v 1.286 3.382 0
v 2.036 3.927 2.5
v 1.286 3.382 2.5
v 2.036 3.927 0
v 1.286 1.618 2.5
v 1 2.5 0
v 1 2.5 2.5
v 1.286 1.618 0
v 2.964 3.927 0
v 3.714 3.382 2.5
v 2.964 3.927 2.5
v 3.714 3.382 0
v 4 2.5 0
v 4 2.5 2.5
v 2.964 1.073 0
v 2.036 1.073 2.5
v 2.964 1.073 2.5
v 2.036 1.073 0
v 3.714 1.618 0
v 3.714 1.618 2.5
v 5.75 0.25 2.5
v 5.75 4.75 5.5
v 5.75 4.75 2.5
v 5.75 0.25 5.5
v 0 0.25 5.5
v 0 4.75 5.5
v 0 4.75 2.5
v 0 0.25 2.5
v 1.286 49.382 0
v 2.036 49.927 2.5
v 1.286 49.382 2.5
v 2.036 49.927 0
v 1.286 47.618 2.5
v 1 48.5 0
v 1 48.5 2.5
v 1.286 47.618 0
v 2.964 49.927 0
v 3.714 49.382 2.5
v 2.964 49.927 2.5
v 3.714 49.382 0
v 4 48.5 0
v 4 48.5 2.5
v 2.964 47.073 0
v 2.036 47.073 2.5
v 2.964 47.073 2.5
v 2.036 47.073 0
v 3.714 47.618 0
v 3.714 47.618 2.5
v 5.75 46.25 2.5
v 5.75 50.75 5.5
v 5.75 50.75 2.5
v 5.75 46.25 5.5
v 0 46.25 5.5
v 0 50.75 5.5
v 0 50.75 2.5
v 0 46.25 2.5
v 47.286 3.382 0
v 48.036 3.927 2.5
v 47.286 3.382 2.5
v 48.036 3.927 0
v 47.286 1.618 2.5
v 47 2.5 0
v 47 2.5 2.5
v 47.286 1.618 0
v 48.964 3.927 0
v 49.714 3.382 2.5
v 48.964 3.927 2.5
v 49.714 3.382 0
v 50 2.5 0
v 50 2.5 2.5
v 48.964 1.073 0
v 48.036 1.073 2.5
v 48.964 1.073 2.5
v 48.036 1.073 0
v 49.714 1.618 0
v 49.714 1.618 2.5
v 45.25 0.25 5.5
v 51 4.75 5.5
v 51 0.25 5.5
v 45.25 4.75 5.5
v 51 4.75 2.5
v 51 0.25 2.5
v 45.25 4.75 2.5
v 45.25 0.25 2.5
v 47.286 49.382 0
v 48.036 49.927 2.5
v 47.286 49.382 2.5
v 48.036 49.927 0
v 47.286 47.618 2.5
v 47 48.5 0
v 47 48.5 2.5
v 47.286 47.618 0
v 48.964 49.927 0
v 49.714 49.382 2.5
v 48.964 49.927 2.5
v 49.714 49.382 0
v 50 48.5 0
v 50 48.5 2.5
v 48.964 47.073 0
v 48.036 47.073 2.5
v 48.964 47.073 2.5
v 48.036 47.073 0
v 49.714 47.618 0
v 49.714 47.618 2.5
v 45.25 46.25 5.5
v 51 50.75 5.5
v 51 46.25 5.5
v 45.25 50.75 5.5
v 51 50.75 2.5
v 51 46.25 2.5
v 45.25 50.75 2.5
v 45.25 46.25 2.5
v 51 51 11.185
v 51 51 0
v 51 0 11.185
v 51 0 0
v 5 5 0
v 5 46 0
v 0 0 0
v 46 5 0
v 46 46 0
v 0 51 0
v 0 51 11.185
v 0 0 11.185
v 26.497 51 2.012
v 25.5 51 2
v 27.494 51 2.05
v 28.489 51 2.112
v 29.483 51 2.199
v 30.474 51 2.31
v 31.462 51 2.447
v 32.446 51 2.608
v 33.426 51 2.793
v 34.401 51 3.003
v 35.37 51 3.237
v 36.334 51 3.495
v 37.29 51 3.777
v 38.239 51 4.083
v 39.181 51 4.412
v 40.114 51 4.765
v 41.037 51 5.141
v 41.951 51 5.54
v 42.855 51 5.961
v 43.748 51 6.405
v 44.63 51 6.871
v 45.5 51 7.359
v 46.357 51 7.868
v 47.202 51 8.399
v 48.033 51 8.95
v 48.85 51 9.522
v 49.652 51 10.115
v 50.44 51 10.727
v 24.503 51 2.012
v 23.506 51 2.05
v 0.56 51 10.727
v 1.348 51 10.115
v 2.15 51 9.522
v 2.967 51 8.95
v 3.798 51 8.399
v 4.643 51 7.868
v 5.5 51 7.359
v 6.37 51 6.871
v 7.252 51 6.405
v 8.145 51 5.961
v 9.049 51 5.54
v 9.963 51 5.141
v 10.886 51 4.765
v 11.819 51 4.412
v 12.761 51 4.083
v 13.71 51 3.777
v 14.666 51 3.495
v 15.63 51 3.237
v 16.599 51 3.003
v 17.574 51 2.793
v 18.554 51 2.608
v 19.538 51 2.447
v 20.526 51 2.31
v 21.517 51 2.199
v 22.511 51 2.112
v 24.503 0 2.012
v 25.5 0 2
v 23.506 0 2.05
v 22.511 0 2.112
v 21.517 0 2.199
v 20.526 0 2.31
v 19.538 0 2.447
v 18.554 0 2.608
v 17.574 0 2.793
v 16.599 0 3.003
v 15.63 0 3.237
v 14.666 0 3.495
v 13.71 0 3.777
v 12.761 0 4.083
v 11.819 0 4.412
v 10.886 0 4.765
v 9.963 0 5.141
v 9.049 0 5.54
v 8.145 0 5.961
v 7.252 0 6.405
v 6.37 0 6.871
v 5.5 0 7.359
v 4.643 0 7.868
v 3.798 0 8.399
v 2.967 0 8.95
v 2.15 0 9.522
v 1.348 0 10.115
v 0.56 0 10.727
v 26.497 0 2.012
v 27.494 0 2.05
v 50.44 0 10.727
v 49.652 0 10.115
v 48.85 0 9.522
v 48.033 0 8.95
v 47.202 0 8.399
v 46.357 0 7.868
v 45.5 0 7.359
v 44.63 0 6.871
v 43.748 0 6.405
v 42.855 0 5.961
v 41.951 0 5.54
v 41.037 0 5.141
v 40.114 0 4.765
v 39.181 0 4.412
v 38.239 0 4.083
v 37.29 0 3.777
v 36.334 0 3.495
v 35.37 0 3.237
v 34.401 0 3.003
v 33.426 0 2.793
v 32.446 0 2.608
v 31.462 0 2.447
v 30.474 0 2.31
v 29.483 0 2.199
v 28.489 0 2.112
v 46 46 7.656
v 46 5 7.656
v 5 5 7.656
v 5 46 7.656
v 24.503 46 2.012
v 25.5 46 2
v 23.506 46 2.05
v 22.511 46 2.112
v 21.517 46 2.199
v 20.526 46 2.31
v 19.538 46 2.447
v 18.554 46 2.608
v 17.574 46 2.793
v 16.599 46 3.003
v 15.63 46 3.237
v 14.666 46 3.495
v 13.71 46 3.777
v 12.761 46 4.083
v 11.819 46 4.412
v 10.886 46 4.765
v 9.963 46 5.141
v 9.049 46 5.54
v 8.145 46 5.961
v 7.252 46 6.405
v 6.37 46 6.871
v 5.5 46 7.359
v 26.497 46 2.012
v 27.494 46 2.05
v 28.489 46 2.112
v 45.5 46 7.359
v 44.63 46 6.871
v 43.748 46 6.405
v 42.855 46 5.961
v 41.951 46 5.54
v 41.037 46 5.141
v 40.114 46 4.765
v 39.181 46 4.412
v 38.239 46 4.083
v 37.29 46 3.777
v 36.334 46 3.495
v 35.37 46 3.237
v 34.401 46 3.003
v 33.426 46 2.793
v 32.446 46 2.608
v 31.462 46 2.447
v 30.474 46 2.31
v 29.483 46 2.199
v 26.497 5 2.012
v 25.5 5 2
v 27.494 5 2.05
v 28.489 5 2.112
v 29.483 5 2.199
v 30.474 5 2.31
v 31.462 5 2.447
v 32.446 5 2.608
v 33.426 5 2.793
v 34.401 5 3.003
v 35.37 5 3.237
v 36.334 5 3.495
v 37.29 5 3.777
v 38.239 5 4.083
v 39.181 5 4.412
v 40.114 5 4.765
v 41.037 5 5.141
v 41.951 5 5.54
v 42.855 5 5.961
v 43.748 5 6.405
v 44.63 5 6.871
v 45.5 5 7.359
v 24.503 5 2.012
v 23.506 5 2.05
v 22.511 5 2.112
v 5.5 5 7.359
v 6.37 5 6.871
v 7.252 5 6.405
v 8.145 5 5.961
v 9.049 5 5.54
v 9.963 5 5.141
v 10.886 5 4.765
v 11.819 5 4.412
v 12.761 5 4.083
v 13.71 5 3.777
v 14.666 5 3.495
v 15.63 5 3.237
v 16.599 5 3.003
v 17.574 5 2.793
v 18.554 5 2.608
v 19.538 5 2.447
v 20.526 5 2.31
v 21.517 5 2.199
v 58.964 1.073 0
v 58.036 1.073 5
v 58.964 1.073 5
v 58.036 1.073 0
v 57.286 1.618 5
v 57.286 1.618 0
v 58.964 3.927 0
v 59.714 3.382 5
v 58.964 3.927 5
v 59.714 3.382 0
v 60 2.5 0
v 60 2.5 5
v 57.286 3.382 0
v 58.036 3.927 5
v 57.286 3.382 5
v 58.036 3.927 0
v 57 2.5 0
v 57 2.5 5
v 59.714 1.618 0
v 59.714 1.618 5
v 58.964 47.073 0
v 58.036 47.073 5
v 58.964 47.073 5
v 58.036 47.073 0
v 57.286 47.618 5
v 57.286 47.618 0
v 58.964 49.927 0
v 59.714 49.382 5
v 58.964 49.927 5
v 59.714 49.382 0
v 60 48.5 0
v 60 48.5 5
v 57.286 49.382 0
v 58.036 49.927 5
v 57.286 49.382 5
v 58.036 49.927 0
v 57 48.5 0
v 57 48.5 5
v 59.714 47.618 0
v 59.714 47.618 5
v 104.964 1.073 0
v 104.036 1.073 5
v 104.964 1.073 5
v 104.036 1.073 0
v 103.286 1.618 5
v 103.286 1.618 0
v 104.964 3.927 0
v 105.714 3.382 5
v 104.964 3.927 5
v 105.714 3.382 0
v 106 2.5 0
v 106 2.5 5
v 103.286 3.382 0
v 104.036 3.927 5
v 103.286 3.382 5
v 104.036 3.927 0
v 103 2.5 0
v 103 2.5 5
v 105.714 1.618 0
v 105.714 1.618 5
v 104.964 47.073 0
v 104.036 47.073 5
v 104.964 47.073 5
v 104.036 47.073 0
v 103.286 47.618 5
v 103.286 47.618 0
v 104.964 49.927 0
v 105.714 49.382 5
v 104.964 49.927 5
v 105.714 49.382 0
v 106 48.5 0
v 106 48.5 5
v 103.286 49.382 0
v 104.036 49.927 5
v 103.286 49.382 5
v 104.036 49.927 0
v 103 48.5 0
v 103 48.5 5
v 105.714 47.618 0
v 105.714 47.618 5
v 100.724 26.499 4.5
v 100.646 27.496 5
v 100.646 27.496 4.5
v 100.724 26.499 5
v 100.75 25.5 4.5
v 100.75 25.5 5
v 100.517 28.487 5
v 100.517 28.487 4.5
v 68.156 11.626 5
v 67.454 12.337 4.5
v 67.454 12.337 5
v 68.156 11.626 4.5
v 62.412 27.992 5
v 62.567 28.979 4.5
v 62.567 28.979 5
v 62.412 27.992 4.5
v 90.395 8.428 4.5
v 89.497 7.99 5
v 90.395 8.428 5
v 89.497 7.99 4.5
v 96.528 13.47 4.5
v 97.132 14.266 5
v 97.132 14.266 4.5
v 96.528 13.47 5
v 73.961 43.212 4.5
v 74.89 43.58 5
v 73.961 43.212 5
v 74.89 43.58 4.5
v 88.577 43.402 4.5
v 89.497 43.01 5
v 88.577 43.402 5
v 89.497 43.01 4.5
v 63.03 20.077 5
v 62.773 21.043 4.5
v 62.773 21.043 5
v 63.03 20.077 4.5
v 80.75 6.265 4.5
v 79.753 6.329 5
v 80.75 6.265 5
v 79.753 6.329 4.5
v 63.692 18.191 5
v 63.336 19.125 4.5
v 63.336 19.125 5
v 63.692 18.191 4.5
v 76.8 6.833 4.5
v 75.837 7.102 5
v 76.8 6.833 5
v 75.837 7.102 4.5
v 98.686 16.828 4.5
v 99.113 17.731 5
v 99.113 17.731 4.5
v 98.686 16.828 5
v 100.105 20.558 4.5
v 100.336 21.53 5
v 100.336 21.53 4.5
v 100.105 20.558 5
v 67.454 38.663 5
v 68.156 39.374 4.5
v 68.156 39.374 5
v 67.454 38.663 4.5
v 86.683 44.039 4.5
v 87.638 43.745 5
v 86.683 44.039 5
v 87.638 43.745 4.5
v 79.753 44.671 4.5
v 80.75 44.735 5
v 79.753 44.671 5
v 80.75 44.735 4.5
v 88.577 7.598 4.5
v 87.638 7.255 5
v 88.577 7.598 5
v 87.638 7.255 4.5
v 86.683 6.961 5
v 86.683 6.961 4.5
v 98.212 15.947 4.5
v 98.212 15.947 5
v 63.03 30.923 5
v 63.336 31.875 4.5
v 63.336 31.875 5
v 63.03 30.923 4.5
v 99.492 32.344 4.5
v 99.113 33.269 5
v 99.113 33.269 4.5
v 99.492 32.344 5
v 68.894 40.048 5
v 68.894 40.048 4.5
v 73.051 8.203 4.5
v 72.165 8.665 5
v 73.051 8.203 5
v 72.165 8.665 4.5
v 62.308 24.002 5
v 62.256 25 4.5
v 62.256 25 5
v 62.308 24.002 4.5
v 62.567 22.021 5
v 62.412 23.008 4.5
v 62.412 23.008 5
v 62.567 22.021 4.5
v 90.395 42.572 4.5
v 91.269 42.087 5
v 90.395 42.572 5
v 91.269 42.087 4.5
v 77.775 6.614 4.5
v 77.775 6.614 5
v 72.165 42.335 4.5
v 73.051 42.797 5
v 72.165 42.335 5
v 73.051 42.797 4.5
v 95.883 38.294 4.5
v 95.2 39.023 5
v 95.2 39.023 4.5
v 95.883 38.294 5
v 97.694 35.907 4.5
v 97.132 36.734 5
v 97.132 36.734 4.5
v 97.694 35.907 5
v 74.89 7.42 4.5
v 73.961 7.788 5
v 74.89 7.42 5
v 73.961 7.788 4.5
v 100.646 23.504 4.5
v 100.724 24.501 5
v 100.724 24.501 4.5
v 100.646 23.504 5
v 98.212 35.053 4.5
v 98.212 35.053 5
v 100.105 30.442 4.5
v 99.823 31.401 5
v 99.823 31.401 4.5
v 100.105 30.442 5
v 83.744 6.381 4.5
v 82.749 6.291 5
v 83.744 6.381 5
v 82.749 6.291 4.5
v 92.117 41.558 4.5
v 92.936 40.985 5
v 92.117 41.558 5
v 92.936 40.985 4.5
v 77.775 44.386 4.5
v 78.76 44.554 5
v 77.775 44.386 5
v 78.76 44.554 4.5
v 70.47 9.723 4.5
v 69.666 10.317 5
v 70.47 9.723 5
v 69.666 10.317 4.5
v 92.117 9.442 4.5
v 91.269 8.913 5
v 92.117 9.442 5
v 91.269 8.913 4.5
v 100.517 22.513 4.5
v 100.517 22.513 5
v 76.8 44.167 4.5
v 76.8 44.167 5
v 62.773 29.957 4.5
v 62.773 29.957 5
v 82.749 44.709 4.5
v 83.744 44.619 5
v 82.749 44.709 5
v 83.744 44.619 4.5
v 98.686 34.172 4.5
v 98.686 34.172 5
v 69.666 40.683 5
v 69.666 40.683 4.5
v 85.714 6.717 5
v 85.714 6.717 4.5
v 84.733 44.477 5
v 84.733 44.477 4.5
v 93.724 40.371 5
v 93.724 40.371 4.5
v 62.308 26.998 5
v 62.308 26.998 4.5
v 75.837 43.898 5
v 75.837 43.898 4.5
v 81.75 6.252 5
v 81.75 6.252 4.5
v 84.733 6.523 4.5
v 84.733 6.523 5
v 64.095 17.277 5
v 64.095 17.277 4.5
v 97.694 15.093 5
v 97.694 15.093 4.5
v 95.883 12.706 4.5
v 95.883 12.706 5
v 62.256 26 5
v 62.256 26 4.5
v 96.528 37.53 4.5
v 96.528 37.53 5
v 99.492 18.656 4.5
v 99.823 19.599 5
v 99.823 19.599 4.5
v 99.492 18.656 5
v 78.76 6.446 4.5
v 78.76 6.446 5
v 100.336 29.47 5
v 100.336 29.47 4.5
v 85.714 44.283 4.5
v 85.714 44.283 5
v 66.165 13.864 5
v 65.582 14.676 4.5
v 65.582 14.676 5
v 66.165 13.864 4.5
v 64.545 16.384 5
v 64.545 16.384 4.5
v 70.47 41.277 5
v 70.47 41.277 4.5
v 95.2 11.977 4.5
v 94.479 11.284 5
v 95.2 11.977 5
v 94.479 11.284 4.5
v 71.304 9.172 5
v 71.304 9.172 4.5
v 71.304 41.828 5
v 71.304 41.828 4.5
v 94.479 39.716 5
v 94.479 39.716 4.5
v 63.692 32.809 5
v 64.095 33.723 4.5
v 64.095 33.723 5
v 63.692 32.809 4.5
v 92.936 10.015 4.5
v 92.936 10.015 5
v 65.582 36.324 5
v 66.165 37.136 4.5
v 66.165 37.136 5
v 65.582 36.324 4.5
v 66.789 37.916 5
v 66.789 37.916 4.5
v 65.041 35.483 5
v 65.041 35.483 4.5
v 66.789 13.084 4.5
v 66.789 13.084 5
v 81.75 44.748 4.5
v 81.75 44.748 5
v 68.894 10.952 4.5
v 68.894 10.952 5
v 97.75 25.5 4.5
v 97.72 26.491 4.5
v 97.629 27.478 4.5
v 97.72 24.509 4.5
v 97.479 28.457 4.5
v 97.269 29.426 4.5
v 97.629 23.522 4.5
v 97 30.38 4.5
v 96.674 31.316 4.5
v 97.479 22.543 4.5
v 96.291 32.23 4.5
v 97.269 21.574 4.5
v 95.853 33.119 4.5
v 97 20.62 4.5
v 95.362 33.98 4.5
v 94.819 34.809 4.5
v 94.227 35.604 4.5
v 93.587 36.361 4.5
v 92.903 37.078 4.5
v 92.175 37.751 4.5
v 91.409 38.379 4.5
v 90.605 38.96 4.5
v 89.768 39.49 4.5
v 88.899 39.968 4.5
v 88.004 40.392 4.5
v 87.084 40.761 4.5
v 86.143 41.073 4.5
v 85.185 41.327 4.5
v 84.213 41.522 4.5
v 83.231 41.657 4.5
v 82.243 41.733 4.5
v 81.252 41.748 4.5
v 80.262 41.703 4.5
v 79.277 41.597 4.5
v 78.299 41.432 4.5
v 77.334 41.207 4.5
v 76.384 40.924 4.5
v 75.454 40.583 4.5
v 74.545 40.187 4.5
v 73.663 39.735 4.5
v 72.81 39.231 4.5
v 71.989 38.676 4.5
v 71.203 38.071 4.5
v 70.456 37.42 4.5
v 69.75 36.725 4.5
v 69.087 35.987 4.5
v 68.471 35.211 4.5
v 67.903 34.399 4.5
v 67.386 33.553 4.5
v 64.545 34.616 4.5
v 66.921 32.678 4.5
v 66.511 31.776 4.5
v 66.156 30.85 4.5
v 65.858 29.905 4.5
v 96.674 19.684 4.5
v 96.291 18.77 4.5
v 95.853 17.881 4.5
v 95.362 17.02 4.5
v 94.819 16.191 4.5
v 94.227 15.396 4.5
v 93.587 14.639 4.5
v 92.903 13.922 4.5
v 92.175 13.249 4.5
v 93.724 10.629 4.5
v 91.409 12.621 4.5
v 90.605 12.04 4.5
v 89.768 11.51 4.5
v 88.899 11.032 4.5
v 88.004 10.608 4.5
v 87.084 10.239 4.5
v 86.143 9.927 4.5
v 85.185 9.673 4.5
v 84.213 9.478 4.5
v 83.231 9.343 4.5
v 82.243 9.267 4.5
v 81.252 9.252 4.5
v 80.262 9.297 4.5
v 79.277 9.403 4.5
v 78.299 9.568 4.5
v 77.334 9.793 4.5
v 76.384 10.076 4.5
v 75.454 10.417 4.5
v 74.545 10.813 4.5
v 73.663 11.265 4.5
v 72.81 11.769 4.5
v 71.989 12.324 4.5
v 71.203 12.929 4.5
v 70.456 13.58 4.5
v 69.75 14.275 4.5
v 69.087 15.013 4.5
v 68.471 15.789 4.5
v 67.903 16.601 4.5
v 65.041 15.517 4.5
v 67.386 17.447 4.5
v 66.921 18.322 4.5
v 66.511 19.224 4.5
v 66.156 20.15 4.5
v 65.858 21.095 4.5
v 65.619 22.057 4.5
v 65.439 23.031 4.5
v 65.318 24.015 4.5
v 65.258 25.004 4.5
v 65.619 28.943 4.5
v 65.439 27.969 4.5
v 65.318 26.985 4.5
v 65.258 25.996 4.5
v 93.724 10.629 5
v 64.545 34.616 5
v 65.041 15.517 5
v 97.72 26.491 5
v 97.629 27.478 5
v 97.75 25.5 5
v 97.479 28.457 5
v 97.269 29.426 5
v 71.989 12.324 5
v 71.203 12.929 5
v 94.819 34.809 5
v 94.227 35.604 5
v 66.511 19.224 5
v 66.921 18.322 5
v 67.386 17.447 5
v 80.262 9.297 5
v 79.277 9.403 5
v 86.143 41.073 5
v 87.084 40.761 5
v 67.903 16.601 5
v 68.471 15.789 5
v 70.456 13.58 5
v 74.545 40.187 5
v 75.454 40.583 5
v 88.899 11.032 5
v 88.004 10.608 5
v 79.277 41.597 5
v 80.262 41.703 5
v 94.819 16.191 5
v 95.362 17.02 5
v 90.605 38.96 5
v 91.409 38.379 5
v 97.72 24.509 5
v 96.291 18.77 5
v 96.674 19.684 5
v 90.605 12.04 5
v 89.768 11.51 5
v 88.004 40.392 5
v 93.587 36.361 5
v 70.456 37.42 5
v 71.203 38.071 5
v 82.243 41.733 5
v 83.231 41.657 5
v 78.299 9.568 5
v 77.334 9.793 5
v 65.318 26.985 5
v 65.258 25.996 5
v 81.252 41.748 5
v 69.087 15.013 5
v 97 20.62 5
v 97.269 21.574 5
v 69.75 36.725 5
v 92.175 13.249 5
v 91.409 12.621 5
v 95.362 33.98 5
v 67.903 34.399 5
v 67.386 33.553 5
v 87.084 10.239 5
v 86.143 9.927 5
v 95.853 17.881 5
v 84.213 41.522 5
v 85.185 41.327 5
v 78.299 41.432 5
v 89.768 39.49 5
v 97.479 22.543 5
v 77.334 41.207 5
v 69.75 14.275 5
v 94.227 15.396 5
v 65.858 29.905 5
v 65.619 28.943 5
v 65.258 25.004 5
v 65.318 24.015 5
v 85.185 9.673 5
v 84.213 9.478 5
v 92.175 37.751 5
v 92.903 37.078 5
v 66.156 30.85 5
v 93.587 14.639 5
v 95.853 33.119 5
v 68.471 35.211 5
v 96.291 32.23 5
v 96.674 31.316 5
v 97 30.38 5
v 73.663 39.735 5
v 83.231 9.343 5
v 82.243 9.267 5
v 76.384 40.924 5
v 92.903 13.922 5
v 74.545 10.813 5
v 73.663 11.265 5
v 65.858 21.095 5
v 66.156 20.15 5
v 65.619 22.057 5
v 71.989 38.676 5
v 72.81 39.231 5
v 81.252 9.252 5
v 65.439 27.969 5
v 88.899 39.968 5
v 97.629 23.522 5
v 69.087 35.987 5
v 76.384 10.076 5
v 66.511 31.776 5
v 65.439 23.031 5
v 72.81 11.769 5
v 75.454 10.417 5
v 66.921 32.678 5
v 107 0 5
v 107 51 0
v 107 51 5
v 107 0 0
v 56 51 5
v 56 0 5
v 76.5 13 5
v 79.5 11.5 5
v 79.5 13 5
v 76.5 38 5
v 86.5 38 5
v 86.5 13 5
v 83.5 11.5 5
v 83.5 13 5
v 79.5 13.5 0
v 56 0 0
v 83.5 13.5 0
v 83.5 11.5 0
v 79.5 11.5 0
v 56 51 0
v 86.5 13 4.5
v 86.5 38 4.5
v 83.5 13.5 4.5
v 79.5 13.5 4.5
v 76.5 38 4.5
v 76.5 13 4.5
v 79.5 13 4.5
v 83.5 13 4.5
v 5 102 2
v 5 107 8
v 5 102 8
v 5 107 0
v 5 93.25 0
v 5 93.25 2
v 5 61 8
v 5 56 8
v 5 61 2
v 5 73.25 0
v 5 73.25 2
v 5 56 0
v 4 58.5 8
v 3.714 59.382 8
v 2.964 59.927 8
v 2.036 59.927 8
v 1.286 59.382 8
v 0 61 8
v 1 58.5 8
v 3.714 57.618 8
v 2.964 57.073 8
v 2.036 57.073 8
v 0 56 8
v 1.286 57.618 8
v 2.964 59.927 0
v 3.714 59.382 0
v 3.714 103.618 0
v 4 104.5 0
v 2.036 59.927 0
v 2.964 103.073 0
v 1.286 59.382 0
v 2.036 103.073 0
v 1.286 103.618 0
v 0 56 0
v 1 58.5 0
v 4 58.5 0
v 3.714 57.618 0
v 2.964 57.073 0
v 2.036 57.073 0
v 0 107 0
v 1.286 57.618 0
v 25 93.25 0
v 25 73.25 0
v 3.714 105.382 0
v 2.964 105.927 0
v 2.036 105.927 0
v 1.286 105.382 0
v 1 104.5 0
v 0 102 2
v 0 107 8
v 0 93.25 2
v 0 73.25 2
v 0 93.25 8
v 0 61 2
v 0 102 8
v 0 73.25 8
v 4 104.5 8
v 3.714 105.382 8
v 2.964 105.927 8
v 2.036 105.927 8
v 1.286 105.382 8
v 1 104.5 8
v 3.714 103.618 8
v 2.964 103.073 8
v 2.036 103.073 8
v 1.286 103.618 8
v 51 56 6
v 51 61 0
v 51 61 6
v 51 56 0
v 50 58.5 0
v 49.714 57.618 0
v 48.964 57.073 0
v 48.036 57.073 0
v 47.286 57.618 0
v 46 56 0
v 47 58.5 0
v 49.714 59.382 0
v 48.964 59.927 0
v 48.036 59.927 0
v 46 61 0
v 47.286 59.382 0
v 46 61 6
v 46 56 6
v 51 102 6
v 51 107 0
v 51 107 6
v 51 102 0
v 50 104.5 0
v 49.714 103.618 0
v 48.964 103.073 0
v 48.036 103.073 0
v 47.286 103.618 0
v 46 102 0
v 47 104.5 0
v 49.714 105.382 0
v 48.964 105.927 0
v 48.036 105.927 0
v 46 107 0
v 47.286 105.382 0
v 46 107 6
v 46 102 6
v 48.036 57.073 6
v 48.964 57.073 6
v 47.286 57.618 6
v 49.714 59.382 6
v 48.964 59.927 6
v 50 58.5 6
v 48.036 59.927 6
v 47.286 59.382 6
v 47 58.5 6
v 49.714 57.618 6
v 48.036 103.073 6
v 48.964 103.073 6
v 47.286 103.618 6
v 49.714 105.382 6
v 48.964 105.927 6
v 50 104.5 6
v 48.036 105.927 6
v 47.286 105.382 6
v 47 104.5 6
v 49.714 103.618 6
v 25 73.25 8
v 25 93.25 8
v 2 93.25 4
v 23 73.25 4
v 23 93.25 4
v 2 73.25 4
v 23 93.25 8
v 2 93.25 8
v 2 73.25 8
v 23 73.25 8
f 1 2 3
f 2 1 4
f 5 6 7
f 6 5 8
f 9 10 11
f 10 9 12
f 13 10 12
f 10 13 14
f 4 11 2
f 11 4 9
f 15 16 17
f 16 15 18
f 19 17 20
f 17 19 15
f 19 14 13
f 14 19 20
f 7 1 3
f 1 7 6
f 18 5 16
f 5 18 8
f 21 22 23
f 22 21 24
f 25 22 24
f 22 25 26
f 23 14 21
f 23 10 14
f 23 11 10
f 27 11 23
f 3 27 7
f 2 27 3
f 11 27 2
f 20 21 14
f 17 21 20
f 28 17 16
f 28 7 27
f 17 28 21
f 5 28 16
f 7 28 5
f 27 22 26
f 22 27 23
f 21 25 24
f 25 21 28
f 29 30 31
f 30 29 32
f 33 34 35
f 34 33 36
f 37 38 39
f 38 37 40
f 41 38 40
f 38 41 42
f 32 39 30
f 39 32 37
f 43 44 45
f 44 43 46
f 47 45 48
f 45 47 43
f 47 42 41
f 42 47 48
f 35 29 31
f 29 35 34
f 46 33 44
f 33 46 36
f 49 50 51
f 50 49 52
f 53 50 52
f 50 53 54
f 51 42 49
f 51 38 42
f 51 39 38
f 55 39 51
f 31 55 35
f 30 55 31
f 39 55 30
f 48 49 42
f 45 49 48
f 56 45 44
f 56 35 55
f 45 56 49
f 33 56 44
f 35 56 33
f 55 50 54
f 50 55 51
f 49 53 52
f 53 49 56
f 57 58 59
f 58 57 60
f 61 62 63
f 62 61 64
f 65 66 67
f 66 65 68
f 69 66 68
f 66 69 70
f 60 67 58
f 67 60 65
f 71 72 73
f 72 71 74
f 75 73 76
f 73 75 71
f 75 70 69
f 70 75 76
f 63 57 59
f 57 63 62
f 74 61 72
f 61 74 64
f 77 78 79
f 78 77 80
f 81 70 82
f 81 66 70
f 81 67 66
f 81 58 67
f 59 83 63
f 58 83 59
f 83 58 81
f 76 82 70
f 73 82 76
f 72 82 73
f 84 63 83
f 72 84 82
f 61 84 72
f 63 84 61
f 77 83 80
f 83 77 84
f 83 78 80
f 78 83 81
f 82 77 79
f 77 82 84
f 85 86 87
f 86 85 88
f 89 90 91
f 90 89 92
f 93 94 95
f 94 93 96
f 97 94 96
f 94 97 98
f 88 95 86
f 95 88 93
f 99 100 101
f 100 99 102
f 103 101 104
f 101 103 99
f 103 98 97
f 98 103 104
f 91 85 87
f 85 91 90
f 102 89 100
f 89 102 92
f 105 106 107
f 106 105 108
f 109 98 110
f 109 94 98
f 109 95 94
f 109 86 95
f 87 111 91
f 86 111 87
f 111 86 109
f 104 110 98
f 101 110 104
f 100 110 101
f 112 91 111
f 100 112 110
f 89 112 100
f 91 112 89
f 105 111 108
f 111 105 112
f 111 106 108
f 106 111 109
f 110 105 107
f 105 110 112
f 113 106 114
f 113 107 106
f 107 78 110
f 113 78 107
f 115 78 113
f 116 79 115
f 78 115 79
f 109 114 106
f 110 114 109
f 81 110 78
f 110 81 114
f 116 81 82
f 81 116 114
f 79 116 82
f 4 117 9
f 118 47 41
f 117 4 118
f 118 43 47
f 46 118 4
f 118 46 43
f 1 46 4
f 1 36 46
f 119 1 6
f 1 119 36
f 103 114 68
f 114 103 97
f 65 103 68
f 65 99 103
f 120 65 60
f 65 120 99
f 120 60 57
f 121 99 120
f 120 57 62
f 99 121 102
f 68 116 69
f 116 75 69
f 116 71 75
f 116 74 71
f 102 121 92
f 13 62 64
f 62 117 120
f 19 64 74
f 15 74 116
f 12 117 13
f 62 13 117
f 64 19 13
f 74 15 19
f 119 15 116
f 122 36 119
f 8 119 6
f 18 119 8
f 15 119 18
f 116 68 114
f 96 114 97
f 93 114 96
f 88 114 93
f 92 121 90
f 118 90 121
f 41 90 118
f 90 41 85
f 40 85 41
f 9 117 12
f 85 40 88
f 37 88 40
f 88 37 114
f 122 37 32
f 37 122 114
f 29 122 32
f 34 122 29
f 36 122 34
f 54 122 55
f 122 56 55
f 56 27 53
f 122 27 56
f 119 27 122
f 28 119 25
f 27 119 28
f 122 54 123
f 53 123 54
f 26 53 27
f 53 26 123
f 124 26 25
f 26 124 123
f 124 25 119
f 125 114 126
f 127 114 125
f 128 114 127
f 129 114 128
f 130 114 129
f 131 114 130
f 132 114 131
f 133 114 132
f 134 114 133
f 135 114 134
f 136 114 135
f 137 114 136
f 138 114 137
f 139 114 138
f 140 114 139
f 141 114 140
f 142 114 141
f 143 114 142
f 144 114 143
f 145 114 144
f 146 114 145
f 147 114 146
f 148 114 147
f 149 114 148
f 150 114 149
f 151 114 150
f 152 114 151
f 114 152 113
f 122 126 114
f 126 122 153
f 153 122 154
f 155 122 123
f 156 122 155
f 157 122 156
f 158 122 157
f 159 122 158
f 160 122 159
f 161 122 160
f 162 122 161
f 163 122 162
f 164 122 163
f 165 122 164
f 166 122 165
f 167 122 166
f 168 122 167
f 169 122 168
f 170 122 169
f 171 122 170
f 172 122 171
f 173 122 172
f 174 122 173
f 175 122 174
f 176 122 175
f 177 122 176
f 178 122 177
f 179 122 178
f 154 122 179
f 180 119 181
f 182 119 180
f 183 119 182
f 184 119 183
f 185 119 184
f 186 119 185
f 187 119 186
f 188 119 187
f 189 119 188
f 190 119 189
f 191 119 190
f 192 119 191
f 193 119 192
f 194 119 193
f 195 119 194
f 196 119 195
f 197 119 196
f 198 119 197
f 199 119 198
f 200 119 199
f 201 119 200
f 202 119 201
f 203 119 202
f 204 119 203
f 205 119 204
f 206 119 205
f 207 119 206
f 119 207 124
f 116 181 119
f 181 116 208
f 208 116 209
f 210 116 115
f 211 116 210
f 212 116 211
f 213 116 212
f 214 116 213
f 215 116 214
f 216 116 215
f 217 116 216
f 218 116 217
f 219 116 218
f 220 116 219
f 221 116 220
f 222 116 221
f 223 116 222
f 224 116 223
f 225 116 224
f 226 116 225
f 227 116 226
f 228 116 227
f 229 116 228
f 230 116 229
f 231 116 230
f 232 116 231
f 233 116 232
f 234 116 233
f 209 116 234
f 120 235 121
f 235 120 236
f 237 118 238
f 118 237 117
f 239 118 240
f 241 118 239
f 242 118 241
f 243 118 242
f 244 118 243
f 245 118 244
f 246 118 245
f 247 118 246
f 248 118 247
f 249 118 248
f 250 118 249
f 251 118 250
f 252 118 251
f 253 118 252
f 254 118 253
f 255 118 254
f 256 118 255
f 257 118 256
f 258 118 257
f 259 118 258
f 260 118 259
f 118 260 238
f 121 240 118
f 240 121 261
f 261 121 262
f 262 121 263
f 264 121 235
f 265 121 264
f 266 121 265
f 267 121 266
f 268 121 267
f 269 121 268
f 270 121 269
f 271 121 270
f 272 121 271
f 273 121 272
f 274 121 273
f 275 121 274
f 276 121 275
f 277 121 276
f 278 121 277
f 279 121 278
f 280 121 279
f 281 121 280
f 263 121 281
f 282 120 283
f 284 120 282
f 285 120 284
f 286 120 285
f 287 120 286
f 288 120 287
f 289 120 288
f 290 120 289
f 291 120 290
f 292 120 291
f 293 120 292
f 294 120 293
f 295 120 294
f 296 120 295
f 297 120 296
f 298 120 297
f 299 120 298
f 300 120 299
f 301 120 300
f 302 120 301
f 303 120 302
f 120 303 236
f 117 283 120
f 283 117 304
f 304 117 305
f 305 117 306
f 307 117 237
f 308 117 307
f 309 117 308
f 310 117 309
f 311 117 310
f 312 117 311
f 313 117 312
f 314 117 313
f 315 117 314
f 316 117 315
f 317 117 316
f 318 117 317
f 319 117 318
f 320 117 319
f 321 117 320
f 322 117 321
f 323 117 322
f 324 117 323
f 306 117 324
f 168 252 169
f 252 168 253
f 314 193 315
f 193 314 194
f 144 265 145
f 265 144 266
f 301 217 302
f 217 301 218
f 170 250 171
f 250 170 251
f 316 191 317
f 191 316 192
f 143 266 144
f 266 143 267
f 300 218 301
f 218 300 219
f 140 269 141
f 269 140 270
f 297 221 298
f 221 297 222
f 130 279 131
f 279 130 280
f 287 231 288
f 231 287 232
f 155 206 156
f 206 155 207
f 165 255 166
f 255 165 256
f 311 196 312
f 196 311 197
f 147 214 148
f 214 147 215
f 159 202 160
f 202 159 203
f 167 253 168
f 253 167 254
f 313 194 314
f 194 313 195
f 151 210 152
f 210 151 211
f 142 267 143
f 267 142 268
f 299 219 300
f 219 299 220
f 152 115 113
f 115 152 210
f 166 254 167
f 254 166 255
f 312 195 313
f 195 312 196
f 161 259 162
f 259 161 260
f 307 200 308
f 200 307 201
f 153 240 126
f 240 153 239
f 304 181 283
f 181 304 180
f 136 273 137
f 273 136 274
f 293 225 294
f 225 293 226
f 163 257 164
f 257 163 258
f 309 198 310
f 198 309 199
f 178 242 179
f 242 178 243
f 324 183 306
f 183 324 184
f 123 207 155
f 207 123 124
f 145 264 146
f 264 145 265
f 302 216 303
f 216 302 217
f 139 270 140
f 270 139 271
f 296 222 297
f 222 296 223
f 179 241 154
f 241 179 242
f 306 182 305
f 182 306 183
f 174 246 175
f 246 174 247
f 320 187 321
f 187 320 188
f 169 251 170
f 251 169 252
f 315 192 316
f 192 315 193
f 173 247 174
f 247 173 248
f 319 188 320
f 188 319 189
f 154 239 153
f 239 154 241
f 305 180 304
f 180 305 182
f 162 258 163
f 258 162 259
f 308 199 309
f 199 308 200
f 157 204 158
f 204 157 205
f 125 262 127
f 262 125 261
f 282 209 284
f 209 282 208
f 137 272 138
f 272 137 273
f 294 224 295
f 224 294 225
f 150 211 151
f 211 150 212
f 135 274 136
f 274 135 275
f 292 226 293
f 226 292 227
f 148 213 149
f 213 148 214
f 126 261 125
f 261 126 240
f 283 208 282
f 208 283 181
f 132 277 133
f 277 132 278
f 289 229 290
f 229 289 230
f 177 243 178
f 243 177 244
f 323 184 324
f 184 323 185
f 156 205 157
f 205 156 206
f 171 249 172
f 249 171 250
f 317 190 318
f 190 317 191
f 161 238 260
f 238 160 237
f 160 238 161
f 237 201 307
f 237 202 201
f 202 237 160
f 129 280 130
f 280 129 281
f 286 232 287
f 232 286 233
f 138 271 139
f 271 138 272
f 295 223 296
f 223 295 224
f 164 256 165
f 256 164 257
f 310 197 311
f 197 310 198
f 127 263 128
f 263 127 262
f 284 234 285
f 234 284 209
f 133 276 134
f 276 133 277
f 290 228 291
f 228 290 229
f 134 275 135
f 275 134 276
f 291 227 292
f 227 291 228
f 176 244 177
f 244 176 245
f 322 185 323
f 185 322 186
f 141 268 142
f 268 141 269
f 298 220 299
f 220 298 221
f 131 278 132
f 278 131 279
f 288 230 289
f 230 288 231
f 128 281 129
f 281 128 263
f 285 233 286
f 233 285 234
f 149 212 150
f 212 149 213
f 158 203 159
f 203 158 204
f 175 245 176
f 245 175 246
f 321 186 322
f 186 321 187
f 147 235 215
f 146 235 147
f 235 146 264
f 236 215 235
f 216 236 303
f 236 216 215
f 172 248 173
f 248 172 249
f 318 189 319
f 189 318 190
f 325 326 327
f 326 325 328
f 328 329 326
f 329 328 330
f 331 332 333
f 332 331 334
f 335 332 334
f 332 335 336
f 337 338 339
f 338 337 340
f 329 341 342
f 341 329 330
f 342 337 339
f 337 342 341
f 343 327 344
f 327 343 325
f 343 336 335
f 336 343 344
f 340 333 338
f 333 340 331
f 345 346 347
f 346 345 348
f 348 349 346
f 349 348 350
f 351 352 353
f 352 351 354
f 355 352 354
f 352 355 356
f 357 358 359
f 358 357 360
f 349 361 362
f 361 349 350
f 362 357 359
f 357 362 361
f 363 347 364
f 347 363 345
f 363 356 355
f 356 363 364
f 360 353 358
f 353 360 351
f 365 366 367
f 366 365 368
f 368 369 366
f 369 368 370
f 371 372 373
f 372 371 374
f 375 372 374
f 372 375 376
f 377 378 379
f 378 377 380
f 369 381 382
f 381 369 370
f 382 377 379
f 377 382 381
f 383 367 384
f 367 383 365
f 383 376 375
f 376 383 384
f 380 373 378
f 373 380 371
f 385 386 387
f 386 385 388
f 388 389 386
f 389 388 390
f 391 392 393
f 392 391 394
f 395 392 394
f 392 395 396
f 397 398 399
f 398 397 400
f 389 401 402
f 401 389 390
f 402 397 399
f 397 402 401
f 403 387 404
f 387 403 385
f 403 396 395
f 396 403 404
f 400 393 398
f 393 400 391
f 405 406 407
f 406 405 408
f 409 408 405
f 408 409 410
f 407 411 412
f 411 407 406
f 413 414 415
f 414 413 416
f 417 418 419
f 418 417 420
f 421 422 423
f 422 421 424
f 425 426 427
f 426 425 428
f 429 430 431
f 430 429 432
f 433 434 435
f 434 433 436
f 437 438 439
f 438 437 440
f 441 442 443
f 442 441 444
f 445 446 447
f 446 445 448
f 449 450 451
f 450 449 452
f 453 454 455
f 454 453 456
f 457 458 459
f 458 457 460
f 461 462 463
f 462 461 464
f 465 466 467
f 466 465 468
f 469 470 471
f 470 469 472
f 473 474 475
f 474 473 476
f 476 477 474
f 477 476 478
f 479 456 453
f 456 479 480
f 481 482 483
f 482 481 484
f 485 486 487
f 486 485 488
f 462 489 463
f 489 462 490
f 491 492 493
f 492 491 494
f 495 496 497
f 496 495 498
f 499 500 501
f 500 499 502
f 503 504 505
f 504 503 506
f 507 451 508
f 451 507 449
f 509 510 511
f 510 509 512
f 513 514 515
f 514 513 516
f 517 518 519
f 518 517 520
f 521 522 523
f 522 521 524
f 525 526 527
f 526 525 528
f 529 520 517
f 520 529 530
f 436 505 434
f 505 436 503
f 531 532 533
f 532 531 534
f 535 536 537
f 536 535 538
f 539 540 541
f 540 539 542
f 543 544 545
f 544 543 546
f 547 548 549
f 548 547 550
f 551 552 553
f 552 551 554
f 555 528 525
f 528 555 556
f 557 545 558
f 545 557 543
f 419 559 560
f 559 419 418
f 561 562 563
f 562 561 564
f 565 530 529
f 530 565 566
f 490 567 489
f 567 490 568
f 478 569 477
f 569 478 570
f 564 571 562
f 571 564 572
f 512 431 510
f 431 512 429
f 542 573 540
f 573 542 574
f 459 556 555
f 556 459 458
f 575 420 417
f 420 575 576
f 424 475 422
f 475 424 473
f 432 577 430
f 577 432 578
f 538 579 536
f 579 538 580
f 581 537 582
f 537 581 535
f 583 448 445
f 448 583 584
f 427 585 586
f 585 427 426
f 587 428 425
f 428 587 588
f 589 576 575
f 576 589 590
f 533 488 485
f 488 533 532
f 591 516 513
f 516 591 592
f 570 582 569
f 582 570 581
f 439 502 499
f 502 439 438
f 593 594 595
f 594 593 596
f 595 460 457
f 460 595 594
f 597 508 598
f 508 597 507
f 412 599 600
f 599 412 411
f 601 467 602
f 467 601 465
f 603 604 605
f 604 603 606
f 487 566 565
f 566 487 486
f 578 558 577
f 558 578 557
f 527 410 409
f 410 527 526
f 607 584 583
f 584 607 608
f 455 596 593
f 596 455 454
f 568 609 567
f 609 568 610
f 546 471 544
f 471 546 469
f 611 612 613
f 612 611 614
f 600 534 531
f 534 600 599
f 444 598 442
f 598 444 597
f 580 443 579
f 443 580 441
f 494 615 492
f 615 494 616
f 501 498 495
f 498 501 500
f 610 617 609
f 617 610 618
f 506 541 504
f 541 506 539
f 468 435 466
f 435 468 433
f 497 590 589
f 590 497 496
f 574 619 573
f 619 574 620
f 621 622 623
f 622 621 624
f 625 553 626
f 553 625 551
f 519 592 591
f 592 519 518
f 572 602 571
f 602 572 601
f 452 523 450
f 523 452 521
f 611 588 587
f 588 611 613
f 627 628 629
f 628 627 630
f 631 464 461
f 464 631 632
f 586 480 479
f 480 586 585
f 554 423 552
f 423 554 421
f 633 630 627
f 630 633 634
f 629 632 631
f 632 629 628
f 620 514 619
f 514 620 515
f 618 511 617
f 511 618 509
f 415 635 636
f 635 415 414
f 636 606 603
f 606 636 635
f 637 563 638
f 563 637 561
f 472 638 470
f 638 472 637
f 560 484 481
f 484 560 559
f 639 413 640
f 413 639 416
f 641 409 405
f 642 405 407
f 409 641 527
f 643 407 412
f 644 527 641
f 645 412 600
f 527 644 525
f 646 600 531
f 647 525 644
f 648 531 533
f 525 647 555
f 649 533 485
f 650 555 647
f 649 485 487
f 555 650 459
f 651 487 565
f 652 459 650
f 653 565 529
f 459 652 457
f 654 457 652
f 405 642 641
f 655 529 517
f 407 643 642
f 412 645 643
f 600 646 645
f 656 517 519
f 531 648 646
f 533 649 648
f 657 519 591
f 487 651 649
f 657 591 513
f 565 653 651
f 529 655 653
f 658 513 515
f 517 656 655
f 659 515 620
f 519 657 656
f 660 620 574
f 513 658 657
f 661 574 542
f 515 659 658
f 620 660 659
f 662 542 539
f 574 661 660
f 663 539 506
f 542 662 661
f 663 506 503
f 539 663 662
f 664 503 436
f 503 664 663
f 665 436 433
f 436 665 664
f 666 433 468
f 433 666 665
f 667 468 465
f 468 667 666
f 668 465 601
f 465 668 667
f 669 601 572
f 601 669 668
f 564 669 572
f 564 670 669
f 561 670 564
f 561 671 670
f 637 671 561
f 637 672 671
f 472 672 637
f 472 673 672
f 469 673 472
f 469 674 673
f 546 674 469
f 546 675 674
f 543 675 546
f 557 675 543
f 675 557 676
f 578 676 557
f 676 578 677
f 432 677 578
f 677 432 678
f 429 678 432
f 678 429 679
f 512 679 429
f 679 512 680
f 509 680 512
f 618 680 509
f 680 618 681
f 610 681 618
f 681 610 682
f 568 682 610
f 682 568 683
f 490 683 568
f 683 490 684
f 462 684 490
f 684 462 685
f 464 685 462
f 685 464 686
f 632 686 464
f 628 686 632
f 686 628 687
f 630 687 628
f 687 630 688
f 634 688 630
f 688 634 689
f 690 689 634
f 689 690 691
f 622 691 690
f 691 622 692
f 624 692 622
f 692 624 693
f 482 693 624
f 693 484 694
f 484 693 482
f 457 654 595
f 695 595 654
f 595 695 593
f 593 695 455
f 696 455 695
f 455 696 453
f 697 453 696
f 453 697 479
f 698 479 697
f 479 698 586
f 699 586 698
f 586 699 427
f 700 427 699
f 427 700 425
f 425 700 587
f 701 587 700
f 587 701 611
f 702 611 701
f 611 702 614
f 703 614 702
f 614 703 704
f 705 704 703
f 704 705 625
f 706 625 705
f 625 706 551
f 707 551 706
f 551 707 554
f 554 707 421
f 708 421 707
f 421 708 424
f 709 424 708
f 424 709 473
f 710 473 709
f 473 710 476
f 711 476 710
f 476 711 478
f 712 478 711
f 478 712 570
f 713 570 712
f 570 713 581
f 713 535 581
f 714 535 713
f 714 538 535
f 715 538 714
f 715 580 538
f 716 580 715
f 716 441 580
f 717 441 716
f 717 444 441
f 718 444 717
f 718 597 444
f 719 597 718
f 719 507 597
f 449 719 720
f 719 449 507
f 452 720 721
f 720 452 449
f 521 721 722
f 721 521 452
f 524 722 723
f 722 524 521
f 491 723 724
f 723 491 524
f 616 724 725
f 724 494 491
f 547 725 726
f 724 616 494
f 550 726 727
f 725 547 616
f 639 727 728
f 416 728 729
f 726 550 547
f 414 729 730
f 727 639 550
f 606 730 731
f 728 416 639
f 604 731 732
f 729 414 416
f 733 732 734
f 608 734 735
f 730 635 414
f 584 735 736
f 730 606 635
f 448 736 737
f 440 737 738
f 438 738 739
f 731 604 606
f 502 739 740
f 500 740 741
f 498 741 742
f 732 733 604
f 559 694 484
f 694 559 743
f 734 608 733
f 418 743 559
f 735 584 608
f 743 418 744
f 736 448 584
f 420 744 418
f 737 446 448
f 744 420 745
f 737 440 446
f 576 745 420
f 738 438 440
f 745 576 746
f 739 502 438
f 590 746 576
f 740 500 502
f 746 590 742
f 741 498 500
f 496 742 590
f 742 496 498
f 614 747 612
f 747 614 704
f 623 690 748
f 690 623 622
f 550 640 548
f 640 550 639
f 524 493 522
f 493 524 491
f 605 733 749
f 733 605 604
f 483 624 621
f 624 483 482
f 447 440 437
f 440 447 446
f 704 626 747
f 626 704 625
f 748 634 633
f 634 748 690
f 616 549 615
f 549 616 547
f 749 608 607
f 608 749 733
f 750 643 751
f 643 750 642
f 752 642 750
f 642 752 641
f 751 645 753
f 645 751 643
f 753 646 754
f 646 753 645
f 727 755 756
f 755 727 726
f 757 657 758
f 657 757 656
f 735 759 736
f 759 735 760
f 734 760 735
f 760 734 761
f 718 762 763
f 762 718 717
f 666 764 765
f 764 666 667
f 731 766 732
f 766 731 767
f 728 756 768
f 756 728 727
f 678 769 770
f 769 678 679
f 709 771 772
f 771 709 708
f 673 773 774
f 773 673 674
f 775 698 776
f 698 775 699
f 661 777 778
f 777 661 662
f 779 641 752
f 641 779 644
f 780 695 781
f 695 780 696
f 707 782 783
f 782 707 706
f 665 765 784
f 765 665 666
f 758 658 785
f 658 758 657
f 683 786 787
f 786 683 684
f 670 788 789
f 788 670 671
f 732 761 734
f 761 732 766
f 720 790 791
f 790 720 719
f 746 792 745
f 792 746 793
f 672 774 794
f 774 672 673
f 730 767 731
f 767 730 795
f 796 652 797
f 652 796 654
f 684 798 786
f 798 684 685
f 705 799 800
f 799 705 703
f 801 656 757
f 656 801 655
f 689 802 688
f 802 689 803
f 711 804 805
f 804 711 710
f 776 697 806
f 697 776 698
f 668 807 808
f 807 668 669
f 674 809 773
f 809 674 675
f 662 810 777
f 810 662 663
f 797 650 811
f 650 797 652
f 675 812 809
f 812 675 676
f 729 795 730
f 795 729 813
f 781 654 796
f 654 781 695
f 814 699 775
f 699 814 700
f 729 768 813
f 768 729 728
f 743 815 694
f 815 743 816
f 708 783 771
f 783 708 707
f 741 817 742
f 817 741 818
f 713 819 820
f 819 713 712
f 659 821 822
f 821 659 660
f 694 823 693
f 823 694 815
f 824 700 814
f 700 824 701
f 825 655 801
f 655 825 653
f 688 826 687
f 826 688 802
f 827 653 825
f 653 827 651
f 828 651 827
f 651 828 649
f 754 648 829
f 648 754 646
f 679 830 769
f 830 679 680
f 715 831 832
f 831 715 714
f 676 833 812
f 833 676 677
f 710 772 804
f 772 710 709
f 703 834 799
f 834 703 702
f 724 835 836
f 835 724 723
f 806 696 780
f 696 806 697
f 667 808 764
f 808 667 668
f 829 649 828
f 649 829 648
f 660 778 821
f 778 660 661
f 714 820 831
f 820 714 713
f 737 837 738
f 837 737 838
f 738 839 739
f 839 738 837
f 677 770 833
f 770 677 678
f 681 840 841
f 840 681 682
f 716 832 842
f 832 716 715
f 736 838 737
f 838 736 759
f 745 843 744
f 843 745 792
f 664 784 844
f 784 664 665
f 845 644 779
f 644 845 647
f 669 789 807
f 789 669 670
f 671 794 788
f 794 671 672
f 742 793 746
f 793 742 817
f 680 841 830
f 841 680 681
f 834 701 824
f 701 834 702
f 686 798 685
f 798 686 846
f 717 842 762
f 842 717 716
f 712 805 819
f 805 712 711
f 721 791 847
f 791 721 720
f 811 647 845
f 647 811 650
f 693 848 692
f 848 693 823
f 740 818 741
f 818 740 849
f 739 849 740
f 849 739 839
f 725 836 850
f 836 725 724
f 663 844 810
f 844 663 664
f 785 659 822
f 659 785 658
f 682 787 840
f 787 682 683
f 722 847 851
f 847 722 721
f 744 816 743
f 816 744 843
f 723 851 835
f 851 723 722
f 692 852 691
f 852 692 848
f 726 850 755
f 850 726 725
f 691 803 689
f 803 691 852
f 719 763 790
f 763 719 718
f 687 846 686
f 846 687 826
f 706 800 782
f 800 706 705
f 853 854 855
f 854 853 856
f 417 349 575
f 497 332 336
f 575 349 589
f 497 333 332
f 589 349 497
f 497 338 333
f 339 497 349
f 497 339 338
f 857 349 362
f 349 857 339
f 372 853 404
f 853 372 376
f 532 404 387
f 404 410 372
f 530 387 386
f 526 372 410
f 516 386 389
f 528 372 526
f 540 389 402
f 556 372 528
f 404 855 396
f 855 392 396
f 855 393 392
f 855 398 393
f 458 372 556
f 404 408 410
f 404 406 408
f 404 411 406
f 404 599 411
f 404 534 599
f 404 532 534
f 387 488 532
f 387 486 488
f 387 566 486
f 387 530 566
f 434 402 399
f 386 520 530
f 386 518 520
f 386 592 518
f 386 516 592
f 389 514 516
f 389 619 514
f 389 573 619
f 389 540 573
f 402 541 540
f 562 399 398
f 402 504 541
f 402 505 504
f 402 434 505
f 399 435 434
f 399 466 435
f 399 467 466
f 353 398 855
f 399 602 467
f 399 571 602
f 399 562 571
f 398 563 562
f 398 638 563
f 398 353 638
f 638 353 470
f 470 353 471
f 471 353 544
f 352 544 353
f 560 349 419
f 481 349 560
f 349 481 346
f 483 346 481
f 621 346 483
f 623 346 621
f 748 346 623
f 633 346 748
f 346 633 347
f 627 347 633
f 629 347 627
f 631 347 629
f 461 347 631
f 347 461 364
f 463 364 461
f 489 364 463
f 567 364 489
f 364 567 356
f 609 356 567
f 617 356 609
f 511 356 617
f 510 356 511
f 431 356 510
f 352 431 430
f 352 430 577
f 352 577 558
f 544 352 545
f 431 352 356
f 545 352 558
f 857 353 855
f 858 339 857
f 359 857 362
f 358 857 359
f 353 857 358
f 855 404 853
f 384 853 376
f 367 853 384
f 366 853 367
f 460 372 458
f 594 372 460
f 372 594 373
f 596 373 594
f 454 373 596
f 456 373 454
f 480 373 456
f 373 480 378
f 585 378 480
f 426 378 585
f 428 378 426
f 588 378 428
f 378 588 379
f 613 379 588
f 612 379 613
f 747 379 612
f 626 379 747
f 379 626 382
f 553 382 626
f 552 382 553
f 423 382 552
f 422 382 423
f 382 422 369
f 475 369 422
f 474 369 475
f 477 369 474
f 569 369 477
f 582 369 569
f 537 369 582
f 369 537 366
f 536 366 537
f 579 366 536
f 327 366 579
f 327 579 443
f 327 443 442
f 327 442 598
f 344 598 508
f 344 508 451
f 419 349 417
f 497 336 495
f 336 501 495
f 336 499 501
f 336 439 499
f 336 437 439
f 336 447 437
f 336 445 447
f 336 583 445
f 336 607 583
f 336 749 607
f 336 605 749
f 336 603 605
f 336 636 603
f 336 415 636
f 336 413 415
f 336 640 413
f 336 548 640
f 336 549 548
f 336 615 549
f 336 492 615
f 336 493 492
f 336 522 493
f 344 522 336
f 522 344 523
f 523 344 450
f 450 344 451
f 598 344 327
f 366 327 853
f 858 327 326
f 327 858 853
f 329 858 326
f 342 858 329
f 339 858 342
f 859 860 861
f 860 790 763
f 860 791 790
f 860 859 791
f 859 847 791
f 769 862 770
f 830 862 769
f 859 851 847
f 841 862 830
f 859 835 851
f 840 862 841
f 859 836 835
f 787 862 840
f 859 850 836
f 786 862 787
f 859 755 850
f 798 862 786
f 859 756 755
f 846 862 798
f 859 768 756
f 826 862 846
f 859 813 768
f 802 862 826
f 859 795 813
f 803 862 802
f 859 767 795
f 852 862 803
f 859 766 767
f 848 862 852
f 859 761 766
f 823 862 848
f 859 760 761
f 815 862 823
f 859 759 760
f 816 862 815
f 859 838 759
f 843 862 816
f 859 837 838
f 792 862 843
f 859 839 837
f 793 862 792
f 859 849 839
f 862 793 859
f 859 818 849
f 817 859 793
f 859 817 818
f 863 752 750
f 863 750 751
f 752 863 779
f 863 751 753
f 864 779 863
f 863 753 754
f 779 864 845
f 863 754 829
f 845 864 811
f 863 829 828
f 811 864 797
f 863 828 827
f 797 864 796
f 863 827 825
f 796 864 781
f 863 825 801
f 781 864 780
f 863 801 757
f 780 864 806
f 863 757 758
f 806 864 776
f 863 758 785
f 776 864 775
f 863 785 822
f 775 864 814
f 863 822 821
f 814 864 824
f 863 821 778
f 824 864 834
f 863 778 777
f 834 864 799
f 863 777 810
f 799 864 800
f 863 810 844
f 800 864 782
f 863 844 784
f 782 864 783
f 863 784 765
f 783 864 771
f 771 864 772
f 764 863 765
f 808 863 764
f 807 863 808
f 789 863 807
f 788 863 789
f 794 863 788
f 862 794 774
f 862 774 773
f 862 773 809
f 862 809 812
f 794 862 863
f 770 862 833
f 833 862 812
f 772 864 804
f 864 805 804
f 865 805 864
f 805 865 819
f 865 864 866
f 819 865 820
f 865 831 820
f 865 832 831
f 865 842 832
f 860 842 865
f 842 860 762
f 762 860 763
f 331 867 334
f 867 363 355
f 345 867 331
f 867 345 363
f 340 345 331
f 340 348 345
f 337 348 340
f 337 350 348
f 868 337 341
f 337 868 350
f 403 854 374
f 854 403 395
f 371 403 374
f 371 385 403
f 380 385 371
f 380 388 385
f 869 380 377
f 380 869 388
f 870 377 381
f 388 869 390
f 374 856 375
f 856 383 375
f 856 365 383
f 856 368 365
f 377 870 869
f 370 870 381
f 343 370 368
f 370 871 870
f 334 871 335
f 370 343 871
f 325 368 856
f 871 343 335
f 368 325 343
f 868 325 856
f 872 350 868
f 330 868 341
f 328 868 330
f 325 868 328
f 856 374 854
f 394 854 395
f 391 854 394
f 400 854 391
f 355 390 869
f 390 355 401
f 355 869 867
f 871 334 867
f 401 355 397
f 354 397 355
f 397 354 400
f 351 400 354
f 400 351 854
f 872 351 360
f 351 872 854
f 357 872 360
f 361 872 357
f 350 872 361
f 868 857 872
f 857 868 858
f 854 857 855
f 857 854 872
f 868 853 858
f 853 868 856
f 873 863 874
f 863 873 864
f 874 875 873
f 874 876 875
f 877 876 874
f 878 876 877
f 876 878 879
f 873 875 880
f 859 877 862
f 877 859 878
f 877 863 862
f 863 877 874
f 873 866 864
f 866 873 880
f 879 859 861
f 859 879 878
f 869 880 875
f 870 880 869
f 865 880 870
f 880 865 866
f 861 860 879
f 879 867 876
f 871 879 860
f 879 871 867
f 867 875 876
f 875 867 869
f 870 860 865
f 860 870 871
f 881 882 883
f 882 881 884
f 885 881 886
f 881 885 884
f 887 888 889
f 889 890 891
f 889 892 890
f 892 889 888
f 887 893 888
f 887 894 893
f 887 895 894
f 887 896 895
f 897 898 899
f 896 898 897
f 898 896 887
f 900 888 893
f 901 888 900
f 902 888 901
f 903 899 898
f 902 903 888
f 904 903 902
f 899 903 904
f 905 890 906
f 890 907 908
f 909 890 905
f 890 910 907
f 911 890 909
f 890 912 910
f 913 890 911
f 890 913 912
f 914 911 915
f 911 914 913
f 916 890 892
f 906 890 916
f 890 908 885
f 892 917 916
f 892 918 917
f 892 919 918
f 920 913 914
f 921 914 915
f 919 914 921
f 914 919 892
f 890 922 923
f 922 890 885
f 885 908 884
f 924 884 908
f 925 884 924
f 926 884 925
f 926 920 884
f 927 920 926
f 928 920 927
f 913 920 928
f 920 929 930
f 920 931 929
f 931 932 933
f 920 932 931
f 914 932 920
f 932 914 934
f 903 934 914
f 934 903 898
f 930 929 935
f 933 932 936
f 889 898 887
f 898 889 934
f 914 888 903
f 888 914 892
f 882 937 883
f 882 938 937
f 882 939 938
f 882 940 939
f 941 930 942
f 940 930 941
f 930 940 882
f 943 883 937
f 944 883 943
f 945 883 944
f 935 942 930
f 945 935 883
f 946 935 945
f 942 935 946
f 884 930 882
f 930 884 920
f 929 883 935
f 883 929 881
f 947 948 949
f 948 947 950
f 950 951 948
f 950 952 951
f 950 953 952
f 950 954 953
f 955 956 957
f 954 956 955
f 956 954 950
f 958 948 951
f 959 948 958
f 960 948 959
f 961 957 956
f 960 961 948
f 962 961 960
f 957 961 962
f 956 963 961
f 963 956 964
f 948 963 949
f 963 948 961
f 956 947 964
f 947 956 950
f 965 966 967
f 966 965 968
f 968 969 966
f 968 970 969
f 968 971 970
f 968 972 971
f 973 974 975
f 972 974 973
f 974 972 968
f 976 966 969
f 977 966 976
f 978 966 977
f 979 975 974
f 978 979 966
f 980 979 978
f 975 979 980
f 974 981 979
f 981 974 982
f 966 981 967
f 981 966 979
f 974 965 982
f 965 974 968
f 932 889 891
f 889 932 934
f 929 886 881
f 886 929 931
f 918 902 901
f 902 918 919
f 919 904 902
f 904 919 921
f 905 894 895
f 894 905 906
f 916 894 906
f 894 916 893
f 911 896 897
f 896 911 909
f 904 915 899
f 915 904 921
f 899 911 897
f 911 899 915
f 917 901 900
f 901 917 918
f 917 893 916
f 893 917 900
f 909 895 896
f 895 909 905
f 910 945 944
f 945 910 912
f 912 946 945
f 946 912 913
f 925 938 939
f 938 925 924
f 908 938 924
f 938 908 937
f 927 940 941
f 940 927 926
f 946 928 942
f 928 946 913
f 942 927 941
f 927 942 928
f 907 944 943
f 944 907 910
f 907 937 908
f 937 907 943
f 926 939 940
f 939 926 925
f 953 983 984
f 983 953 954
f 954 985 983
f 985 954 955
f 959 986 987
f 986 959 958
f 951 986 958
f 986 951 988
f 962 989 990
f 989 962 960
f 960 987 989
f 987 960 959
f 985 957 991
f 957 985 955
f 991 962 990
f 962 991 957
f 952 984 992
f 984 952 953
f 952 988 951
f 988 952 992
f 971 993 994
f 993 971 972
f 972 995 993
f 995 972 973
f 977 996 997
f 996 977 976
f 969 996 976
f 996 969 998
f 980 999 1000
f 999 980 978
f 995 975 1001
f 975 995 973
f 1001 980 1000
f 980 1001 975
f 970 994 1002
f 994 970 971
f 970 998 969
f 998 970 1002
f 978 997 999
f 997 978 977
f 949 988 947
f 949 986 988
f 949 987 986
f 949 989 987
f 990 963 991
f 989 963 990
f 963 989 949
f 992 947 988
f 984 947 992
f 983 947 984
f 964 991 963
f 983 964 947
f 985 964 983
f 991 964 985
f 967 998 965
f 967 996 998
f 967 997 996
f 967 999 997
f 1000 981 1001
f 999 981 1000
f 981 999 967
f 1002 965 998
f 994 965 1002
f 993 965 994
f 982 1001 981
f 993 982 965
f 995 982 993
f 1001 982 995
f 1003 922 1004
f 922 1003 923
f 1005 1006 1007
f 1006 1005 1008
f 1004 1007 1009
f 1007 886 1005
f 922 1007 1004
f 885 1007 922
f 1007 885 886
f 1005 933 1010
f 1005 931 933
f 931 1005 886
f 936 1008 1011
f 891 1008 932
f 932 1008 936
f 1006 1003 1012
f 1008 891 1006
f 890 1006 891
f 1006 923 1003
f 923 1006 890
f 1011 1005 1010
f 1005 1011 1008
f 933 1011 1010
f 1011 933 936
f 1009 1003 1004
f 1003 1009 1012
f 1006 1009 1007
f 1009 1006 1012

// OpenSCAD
echo(version=version());

// Values are in millimeters

$fa=1;
$fs=1;
////////////////////////////
// Adjust these for cup
cupDiameter = 80;
wallThickness=5;

mountingNutWidth = 4.5;
mountingNutLength = mountingNutWidth;
mountingNutDepth = 3;

zipTieWidth = 5;
zipTieThick = 1;

coilDiameter = 38.5;
coilInnerDiameter = 32.5;
coilThickness = 2;

coilCircutWidth = 10;
coilCircutLength = 25;
coilCircutDepth = 2;

battMountThick = 2;
battMountLength = 20;

lipoWidth = 21;
lipoLength = 29;
lipoDepth = 4;

featherWidth = 23;
featherLength = 51;
featherDepth = 8; // includes components
featherCircuitDepth = 2;

wireD = 2;
// http://www.csgnetwork.com/screwsochdcaptable.html
mountingScrewD = 3; // Good fit screw is M2.5
mountingScrewLength = wallThickness*3 + featherDepth;

baseSize = featherLength;

////////////////////////////
// Lower part
rotate([0,0,0])
difference() {
	cube(size=[baseSize,baseSize,15]);

	// cutout center to thin this down. (don't need it solid)
	translate([wallThickness,wallThickness,-1])
		cube(size=[baseSize-(wallThickness*2),baseSize-(wallThickness*2),10]);

	// Cutout the curve of the mug
	translate([baseSize/2, -2.5, (cupDiameter/2)+2])
		rotate([-90,0,0])
			cylinder(h=baseSize+5, d=cupDiameter);

	// Cutout path for zip-tie.
	rotate([90,0,0])
	translate([baseSize/2,baseSize,-baseSize/2])
		difference() {
			cylinder(h=zipTieWidth, d=cupDiameter+(zipTieThick*2));
			translate([0,0,-1])
			cylinder(h=zipTieWidth+2, d=cupDiameter);
		}

	// cutout for mounting screws
	for(ox=[mountingScrewD/2+1,baseSize-(mountingScrewD/2)-1]) {
		for(oy=[mountingScrewD/2+1,baseSize-(mountingScrewD/2)-1]) {
			translate([ox,oy,-1]) {
				cylinder(h=wallThickness, d=mountingScrewD);
				translate([0,0,wallThickness])
				cube(size=[mountingNutWidth+2,mountingNutLength,mountingNutDepth], center=true);
			}
		}
	}

	// Cutout for nuts
}

////////////////////////////
// Coil Mount / Top piece

translate([baseSize+5, 0, 0])
difference() {
	cube(size=[baseSize,baseSize,wallThickness]);

	// cutout for mounting screws
	for(ox=[mountingScrewD/2+1,baseSize-(mountingScrewD/2)-1]) {
		for(oy=[mountingScrewD/2+1,baseSize-(mountingScrewD/2)-1]) {
			translate([ox,oy,-1])
				cylinder(h=wallThickness+2, d=mountingScrewD);
		}
	}

	// Cut out a place for the coil
	translate([baseSize/2,baseSize/2,wallThickness-0.5])
		difference() {
			cylinder(h=coilThickness, d=coilDiameter);
			translate([0,0,-1])
				cylinder(h=coilThickness+2, d=coilInnerDiameter);
		}

	// Cutout place for the coil circut
	translate([baseSize/2-coilCircutWidth/2,baseSize/2-coilCircutLength/2,wallThickness-0.5])
		cube(size=[coilCircutWidth,coilCircutLength,coilCircutDepth]);

	// cutout for wires.
	translate([baseSize/2-wireD, coilCircutLength/2-wireD/2,-1])
		cube(size=[wireD*2,wireD,wallThickness+2]);
}

////////////////////////////
// Middle bit / battery holder and circuit
translate([0,baseSize+5,0])
union() {
	// Rail to mounting screws.
	difference() {
		union() {
			cube(size=[mountingScrewD+2, baseSize, battMountThick]);

			// Standoffs for the screws
			for(ox=[0,baseSize-(mountingScrewD+2)]) {
				for(oy=[0,baseSize-(mountingScrewD+2)]) {
					translate([ox,oy,0])
						cube(size=[mountingScrewD+2, mountingScrewD+2, featherDepth]);
				}
			}
		}
		// cutout for mounting screws
		for(ox=[mountingScrewD/2+1,baseSize-(mountingScrewD/2)-1]) {
			for(oy=[mountingScrewD/2+1,baseSize-(mountingScrewD/2)-1]) {
				translate([ox,oy,-1])
					cylinder(h=featherDepth+2, d=mountingScrewD);
			}
		}
		// cut off tops for holding the circuit board
		translate([baseSize-(mountingScrewD+2)-0.5, -0.5, featherDepth-featherCircuitDepth])
			cube(size=[mountingScrewD+3, baseSize+1, featherCircuitDepth+1]);
	}

	// Show the battery for sighting
	%translate([battMountThick, baseSize/4, featherDepth-lipoDepth])
		cube(size=[lipoWidth,lipoLength,lipoDepth]);

	// Show the feather circuit board for sighting
	%translate([baseSize-featherWidth,0,0])
		cube(size=[featherWidth,featherLength,featherDepth]);

	// Battery clip
	translate([0,baseSize/4,0])
	union() {
		translate([0,lipoLength/2-(battMountLength/2),0])
			cube(size=[lipoWidth+(battMountThick*2), battMountLength, featherDepth-lipoDepth]);
		translate([0,lipoLength/2-(battMountLength/2), 0])
			cube(size=[2, battMountLength, featherDepth]);
		translate([lipoWidth+battMountThick,lipoLength/2-(battMountLength/2), 0])
			cube(size=[2, battMountLength, featherDepth]);
	}
}
//	vim: set sw=2 ts=2 :
